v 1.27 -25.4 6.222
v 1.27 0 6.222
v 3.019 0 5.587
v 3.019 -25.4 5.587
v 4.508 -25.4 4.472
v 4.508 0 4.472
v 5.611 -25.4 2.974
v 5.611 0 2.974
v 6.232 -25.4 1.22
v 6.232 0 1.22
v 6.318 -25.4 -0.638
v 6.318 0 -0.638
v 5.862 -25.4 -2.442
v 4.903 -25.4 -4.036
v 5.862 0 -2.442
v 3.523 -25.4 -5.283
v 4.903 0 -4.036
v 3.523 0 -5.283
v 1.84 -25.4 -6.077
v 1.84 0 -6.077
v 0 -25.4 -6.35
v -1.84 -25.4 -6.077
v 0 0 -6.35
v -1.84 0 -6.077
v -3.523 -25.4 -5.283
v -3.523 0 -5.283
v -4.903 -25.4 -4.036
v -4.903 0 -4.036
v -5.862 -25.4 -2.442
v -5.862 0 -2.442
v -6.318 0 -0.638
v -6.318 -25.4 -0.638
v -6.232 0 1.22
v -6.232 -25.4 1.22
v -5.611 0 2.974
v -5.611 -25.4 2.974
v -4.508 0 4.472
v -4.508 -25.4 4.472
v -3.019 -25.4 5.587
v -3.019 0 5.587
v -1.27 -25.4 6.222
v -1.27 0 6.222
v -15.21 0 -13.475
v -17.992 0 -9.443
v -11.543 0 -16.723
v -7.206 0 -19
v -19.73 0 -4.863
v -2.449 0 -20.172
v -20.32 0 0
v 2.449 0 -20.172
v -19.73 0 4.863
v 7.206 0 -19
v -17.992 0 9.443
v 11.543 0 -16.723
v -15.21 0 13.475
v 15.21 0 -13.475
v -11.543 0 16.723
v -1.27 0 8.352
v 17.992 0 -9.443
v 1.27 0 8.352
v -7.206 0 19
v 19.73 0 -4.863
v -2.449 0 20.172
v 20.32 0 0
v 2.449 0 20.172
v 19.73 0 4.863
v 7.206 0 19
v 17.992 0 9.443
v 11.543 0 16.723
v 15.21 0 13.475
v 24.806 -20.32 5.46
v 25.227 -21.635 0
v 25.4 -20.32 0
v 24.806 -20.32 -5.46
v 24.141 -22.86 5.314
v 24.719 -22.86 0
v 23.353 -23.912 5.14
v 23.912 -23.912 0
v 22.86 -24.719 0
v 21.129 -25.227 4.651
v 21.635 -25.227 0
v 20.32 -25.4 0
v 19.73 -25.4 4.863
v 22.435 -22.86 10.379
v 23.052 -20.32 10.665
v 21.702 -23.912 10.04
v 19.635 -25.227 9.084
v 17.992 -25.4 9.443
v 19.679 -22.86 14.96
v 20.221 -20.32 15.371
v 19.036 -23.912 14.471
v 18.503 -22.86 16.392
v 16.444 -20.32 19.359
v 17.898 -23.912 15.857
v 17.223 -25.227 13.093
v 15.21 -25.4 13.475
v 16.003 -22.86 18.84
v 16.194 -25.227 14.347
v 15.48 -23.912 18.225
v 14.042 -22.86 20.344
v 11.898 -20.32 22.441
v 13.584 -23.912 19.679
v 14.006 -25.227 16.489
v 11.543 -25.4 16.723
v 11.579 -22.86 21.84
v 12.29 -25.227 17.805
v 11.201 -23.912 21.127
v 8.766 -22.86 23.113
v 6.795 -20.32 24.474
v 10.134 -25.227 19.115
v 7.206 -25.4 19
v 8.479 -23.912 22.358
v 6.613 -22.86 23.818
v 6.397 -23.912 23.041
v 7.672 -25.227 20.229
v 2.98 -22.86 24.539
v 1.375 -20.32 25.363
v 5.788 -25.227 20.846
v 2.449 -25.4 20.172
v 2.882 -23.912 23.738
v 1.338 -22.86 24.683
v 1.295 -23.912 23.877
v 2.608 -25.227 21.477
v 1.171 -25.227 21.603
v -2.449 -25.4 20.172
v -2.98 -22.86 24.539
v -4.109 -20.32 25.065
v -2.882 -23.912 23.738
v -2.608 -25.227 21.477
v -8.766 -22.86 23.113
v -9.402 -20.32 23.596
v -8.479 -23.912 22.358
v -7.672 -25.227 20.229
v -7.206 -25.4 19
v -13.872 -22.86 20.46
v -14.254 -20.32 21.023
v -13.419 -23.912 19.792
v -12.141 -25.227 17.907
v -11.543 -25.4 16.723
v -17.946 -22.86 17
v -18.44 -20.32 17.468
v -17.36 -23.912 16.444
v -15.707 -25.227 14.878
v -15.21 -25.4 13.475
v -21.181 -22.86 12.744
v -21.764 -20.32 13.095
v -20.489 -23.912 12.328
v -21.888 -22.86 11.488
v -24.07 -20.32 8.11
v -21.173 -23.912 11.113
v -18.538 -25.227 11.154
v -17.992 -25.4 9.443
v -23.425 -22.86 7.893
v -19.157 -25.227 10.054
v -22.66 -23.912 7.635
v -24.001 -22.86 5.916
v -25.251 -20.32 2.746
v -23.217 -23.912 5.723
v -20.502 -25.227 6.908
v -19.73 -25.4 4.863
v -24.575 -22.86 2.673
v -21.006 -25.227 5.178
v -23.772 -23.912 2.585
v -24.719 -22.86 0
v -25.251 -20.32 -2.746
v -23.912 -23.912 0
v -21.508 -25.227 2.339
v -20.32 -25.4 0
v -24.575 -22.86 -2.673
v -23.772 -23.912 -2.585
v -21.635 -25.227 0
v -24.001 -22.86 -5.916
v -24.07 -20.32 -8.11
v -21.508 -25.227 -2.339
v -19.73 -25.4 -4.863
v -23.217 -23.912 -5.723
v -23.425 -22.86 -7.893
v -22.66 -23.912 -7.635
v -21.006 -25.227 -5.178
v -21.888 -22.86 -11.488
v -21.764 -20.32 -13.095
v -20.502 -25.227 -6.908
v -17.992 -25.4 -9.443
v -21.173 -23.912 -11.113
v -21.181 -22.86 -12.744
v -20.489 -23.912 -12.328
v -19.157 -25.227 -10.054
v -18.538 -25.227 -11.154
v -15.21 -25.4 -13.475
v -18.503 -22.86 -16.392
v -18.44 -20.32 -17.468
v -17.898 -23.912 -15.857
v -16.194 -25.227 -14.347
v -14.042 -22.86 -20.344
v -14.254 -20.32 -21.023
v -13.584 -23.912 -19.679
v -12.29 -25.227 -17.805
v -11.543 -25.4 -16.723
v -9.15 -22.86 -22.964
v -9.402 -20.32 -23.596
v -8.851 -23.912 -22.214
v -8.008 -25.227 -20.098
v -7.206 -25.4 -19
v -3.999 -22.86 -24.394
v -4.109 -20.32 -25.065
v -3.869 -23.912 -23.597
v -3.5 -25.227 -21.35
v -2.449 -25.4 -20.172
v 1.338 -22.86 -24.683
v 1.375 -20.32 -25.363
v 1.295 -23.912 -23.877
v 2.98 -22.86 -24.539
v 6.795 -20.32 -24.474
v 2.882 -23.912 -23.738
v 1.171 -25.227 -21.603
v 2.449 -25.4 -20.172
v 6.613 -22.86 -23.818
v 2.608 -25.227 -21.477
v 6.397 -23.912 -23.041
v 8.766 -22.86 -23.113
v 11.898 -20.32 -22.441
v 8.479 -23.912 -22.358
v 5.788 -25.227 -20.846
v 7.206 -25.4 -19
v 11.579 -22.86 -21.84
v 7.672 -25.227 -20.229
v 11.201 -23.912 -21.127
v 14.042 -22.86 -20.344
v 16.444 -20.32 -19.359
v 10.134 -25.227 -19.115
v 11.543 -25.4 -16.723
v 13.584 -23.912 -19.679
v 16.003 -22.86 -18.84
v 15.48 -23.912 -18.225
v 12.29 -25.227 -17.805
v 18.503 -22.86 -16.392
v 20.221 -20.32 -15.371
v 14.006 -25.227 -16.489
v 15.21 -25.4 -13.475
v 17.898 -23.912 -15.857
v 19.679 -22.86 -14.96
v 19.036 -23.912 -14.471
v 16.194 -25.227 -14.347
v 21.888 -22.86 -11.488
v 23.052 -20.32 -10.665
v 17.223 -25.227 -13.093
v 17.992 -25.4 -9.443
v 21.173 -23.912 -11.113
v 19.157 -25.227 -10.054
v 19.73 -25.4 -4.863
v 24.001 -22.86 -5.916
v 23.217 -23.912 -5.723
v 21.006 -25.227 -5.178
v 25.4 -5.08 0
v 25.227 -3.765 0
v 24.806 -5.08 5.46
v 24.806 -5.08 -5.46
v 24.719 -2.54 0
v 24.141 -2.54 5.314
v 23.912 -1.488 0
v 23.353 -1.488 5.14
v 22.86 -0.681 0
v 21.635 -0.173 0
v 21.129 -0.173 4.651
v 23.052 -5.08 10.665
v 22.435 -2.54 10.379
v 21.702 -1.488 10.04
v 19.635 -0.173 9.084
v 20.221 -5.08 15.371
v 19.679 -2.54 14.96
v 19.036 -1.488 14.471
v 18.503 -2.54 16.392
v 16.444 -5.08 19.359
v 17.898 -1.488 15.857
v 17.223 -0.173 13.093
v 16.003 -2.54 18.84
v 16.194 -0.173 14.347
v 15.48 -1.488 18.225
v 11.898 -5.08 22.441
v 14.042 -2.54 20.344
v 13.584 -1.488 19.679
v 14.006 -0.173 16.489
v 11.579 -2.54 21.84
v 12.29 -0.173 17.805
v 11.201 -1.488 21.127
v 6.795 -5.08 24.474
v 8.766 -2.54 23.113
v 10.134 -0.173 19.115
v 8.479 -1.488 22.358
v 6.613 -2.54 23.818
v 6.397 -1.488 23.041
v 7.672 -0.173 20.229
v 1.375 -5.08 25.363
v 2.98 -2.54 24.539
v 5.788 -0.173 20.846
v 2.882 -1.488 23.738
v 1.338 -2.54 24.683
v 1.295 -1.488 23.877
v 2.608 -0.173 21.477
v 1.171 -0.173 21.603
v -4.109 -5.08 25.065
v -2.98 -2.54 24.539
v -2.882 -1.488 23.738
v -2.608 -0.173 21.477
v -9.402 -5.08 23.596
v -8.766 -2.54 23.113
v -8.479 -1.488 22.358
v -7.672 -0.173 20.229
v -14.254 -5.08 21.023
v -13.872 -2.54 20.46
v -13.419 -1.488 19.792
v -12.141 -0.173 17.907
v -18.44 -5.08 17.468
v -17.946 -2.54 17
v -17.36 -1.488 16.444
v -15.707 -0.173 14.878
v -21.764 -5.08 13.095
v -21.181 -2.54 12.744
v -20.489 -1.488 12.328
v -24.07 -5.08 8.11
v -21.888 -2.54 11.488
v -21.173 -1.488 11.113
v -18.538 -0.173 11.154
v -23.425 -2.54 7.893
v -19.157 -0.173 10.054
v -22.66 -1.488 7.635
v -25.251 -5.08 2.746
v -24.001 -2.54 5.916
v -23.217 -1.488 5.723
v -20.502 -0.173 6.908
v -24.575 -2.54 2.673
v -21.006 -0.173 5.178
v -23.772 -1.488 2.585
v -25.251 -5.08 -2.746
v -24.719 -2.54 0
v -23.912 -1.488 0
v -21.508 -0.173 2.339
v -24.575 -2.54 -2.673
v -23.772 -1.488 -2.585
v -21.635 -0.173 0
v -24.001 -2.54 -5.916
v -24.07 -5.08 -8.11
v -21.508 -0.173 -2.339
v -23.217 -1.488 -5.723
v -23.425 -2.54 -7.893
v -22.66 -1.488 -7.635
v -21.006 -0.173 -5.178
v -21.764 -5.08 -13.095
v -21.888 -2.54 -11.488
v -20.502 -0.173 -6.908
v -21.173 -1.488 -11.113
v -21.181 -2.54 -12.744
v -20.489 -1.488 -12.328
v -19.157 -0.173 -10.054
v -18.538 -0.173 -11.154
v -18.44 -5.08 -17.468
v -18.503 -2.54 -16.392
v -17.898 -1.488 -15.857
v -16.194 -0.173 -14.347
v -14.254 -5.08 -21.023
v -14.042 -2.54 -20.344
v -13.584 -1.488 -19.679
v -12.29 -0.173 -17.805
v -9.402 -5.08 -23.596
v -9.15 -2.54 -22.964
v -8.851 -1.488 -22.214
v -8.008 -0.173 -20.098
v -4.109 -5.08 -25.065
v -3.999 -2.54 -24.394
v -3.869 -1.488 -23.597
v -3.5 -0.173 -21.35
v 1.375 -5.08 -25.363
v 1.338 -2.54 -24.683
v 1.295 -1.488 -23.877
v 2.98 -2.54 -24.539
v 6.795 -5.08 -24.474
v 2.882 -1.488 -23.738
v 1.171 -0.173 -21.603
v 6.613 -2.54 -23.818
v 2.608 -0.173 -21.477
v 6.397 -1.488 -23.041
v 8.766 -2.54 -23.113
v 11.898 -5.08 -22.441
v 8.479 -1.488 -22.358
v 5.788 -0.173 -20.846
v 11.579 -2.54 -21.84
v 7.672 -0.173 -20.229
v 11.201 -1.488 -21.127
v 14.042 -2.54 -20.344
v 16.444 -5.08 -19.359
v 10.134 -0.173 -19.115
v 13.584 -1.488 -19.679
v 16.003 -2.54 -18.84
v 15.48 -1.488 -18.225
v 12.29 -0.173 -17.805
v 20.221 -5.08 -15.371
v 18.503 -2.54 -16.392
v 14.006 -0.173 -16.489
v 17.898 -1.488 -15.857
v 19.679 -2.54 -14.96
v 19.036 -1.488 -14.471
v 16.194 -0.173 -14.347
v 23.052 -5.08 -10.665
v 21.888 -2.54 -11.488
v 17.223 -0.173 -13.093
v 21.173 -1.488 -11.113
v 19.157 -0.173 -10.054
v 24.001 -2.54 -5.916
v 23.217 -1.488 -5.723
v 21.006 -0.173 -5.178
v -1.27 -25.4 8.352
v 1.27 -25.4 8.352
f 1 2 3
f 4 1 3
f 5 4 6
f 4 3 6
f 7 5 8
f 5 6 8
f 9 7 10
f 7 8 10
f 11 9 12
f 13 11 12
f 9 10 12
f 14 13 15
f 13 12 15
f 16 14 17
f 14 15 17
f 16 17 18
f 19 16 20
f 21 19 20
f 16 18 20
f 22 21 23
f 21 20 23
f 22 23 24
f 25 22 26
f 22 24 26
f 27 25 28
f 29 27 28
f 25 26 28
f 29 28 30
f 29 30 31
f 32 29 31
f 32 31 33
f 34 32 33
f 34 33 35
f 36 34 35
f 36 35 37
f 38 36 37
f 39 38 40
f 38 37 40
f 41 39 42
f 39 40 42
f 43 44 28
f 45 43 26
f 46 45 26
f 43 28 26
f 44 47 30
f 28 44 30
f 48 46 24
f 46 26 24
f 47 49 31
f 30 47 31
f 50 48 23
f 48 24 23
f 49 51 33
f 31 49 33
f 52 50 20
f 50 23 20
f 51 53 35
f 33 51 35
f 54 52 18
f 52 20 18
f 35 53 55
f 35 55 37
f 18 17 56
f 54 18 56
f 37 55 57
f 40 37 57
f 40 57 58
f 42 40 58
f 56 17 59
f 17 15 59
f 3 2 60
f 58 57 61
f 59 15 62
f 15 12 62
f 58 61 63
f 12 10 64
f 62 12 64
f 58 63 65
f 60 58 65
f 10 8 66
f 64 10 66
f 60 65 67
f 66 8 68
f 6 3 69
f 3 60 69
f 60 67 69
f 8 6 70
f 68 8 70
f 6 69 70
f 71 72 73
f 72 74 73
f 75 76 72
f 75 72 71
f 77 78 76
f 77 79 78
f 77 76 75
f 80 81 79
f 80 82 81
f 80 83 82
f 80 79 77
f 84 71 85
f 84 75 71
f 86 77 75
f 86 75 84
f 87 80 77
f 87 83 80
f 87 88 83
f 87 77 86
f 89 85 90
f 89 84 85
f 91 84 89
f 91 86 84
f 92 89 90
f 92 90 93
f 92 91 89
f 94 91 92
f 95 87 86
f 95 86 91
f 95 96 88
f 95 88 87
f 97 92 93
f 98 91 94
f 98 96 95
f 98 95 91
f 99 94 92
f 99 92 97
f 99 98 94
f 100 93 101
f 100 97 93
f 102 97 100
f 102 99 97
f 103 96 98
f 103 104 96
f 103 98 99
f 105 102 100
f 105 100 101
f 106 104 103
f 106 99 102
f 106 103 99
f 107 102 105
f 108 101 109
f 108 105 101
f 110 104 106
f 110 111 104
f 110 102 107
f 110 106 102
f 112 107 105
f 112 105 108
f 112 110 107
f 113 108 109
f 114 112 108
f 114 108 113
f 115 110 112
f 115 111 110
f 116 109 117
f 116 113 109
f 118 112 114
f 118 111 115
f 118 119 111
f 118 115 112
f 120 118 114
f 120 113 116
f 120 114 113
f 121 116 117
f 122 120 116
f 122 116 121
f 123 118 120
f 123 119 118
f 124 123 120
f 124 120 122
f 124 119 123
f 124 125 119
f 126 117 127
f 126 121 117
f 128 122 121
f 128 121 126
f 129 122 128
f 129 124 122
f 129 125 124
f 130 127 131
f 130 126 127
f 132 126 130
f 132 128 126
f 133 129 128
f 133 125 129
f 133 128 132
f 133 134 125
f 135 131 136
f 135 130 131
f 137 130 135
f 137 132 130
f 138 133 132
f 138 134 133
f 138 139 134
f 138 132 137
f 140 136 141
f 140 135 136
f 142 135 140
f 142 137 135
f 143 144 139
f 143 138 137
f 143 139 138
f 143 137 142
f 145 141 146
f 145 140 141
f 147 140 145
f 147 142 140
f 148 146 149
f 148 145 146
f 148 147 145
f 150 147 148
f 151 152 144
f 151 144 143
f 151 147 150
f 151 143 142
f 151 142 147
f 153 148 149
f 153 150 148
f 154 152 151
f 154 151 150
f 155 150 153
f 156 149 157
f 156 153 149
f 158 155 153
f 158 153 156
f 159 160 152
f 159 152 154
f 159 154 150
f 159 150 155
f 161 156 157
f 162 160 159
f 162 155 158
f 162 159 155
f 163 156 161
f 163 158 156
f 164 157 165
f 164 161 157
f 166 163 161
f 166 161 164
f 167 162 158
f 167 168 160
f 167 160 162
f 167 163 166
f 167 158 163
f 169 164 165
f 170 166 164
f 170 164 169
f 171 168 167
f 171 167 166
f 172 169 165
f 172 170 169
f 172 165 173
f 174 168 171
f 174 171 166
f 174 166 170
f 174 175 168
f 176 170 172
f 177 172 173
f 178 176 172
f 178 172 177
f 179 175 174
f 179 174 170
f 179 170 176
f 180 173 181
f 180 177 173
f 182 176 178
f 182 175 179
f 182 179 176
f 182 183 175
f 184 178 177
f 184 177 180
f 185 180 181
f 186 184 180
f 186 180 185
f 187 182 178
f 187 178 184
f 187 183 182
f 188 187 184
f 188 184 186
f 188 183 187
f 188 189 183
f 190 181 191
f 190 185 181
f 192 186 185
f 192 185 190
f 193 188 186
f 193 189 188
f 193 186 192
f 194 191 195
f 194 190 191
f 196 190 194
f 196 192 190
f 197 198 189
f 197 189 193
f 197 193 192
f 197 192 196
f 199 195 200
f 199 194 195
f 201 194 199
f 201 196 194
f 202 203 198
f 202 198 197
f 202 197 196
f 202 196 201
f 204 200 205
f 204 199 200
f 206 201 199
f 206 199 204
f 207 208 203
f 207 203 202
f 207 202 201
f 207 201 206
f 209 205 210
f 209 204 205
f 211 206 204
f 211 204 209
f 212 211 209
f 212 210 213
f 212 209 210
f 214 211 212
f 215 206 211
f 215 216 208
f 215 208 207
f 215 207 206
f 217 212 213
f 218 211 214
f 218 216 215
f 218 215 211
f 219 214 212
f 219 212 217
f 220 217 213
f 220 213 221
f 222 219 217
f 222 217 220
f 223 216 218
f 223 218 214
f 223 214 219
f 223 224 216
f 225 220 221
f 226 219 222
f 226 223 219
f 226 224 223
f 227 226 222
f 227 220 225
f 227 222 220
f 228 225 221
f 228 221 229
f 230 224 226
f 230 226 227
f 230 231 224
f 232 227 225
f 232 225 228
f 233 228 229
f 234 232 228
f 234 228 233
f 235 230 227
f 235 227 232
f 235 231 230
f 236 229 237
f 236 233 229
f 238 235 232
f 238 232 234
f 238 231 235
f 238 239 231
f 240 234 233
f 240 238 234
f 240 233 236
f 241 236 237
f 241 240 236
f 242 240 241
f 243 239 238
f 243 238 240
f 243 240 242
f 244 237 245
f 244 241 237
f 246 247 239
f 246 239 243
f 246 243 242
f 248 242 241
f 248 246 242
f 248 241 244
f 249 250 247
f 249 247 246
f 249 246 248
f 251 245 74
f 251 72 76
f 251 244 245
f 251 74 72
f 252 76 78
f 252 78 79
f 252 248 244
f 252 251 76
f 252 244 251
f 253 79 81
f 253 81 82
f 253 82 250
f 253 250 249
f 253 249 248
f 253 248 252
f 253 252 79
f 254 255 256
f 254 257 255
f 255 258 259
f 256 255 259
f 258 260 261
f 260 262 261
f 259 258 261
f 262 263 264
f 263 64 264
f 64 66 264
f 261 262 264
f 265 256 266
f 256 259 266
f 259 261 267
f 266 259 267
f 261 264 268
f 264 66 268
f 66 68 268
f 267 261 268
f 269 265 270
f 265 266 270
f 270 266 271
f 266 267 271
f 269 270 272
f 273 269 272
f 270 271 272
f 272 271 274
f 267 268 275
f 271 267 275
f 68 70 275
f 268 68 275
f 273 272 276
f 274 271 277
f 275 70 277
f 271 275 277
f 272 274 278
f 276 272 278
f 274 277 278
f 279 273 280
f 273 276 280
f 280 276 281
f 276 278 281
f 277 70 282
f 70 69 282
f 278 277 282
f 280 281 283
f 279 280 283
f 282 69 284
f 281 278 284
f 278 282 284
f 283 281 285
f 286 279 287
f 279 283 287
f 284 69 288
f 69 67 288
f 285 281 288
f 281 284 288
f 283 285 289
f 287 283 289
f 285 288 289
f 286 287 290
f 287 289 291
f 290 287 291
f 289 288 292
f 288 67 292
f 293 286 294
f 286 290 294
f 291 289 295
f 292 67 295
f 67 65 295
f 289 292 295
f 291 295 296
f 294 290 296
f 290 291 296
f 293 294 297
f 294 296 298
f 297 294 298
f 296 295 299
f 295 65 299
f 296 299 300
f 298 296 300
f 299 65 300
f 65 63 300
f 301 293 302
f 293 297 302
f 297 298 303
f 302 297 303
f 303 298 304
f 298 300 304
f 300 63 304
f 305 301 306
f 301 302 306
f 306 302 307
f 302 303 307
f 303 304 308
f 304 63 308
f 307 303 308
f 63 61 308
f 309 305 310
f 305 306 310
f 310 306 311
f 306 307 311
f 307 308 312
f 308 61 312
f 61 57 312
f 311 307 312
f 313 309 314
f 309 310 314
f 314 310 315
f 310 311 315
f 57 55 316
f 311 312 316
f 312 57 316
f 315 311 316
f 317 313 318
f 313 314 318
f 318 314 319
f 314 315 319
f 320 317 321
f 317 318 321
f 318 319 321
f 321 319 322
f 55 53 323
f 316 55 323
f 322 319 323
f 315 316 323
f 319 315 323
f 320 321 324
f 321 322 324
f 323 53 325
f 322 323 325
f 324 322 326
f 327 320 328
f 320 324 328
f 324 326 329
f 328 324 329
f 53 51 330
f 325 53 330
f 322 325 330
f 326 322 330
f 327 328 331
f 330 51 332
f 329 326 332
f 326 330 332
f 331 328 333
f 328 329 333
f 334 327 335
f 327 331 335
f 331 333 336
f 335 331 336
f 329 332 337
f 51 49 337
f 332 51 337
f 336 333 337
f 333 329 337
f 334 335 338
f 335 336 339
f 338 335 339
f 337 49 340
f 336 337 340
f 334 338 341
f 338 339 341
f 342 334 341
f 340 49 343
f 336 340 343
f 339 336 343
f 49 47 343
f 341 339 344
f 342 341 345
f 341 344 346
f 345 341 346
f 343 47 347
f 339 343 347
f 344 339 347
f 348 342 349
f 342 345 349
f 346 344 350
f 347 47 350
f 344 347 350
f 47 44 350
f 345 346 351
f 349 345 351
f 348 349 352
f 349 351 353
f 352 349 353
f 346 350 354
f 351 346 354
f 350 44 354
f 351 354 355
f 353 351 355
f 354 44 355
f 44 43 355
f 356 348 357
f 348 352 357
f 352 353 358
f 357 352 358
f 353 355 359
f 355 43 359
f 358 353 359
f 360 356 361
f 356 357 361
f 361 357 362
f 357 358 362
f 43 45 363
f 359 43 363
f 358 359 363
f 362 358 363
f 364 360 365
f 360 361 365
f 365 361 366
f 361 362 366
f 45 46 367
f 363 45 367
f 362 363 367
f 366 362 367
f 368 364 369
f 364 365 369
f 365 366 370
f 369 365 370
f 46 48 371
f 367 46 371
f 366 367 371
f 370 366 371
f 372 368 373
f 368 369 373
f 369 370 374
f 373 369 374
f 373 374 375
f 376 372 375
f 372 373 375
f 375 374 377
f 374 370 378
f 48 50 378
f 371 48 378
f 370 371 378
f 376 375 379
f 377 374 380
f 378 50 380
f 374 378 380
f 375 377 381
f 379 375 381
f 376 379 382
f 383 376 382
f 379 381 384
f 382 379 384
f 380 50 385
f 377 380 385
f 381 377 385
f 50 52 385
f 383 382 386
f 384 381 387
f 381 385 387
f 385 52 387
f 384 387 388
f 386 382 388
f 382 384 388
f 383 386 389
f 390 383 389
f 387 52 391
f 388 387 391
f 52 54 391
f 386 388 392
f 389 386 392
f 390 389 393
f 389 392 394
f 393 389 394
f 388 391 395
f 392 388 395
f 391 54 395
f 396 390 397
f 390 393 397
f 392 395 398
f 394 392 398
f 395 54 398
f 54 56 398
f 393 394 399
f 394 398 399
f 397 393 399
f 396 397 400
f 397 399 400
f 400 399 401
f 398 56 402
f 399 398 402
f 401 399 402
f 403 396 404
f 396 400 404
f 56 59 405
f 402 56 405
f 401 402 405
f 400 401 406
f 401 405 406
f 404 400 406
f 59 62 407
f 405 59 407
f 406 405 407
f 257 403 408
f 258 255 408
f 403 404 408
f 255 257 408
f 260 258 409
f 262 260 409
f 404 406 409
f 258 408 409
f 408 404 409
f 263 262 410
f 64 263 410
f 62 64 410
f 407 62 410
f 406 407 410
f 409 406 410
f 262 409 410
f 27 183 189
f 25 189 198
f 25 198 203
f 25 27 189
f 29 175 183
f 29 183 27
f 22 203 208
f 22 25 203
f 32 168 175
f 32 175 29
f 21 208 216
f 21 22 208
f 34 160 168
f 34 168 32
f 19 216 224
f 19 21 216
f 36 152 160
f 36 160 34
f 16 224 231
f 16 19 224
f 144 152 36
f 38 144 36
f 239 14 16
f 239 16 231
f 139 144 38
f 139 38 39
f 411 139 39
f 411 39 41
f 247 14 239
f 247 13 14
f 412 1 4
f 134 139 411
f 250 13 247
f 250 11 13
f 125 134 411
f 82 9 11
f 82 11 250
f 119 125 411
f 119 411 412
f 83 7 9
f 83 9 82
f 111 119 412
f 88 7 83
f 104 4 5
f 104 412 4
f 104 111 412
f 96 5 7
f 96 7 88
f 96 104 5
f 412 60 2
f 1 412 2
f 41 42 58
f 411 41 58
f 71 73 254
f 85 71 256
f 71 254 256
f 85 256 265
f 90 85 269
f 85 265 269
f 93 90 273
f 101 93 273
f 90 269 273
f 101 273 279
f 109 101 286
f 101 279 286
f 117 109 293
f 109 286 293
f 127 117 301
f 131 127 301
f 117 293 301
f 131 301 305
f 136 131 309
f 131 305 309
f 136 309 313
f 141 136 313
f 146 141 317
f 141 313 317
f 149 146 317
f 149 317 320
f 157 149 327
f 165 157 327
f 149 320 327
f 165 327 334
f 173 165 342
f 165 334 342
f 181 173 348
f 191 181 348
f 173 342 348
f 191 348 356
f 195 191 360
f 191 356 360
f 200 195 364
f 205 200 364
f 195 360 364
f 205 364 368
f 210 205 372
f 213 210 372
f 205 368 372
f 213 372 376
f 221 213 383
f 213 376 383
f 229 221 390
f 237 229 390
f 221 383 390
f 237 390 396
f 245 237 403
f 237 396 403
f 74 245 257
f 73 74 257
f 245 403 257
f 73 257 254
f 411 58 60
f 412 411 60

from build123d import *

# Parameters (mm, degrees)
F0_R     = 25.4
F1_DEPTH = 25.4
F2_R     = 5.08


with BuildPart() as f1:
    # F0 (on Front) → F1 (new body)
    with BuildSketch(Plane.XZ):
        Circle(F0_R)
        with BuildLine():
            ThreePointArc((1.27, 6.221704), (0, -6.35), (-1.27, 6.221704))
            Line((-1.27, 6.221704), (-1.27, 8.351671))
            Line((-1.27, 8.351671), (1.27, 8.351671))
            Line((1.27, 8.351671), (1.27, 6.221704))
        make_face(mode=Mode.SUBTRACT)
    extrude(amount=F1_DEPTH)

    # F2
    f2_edges = [f1.edges().sort_by_distance(p)[0] for p in [
        (-25.4, 0, 0),
        (-25.4, -25.4, 0),
    ]]
    fillet(f2_edges, radius=F2_R)


solid = f1.part
